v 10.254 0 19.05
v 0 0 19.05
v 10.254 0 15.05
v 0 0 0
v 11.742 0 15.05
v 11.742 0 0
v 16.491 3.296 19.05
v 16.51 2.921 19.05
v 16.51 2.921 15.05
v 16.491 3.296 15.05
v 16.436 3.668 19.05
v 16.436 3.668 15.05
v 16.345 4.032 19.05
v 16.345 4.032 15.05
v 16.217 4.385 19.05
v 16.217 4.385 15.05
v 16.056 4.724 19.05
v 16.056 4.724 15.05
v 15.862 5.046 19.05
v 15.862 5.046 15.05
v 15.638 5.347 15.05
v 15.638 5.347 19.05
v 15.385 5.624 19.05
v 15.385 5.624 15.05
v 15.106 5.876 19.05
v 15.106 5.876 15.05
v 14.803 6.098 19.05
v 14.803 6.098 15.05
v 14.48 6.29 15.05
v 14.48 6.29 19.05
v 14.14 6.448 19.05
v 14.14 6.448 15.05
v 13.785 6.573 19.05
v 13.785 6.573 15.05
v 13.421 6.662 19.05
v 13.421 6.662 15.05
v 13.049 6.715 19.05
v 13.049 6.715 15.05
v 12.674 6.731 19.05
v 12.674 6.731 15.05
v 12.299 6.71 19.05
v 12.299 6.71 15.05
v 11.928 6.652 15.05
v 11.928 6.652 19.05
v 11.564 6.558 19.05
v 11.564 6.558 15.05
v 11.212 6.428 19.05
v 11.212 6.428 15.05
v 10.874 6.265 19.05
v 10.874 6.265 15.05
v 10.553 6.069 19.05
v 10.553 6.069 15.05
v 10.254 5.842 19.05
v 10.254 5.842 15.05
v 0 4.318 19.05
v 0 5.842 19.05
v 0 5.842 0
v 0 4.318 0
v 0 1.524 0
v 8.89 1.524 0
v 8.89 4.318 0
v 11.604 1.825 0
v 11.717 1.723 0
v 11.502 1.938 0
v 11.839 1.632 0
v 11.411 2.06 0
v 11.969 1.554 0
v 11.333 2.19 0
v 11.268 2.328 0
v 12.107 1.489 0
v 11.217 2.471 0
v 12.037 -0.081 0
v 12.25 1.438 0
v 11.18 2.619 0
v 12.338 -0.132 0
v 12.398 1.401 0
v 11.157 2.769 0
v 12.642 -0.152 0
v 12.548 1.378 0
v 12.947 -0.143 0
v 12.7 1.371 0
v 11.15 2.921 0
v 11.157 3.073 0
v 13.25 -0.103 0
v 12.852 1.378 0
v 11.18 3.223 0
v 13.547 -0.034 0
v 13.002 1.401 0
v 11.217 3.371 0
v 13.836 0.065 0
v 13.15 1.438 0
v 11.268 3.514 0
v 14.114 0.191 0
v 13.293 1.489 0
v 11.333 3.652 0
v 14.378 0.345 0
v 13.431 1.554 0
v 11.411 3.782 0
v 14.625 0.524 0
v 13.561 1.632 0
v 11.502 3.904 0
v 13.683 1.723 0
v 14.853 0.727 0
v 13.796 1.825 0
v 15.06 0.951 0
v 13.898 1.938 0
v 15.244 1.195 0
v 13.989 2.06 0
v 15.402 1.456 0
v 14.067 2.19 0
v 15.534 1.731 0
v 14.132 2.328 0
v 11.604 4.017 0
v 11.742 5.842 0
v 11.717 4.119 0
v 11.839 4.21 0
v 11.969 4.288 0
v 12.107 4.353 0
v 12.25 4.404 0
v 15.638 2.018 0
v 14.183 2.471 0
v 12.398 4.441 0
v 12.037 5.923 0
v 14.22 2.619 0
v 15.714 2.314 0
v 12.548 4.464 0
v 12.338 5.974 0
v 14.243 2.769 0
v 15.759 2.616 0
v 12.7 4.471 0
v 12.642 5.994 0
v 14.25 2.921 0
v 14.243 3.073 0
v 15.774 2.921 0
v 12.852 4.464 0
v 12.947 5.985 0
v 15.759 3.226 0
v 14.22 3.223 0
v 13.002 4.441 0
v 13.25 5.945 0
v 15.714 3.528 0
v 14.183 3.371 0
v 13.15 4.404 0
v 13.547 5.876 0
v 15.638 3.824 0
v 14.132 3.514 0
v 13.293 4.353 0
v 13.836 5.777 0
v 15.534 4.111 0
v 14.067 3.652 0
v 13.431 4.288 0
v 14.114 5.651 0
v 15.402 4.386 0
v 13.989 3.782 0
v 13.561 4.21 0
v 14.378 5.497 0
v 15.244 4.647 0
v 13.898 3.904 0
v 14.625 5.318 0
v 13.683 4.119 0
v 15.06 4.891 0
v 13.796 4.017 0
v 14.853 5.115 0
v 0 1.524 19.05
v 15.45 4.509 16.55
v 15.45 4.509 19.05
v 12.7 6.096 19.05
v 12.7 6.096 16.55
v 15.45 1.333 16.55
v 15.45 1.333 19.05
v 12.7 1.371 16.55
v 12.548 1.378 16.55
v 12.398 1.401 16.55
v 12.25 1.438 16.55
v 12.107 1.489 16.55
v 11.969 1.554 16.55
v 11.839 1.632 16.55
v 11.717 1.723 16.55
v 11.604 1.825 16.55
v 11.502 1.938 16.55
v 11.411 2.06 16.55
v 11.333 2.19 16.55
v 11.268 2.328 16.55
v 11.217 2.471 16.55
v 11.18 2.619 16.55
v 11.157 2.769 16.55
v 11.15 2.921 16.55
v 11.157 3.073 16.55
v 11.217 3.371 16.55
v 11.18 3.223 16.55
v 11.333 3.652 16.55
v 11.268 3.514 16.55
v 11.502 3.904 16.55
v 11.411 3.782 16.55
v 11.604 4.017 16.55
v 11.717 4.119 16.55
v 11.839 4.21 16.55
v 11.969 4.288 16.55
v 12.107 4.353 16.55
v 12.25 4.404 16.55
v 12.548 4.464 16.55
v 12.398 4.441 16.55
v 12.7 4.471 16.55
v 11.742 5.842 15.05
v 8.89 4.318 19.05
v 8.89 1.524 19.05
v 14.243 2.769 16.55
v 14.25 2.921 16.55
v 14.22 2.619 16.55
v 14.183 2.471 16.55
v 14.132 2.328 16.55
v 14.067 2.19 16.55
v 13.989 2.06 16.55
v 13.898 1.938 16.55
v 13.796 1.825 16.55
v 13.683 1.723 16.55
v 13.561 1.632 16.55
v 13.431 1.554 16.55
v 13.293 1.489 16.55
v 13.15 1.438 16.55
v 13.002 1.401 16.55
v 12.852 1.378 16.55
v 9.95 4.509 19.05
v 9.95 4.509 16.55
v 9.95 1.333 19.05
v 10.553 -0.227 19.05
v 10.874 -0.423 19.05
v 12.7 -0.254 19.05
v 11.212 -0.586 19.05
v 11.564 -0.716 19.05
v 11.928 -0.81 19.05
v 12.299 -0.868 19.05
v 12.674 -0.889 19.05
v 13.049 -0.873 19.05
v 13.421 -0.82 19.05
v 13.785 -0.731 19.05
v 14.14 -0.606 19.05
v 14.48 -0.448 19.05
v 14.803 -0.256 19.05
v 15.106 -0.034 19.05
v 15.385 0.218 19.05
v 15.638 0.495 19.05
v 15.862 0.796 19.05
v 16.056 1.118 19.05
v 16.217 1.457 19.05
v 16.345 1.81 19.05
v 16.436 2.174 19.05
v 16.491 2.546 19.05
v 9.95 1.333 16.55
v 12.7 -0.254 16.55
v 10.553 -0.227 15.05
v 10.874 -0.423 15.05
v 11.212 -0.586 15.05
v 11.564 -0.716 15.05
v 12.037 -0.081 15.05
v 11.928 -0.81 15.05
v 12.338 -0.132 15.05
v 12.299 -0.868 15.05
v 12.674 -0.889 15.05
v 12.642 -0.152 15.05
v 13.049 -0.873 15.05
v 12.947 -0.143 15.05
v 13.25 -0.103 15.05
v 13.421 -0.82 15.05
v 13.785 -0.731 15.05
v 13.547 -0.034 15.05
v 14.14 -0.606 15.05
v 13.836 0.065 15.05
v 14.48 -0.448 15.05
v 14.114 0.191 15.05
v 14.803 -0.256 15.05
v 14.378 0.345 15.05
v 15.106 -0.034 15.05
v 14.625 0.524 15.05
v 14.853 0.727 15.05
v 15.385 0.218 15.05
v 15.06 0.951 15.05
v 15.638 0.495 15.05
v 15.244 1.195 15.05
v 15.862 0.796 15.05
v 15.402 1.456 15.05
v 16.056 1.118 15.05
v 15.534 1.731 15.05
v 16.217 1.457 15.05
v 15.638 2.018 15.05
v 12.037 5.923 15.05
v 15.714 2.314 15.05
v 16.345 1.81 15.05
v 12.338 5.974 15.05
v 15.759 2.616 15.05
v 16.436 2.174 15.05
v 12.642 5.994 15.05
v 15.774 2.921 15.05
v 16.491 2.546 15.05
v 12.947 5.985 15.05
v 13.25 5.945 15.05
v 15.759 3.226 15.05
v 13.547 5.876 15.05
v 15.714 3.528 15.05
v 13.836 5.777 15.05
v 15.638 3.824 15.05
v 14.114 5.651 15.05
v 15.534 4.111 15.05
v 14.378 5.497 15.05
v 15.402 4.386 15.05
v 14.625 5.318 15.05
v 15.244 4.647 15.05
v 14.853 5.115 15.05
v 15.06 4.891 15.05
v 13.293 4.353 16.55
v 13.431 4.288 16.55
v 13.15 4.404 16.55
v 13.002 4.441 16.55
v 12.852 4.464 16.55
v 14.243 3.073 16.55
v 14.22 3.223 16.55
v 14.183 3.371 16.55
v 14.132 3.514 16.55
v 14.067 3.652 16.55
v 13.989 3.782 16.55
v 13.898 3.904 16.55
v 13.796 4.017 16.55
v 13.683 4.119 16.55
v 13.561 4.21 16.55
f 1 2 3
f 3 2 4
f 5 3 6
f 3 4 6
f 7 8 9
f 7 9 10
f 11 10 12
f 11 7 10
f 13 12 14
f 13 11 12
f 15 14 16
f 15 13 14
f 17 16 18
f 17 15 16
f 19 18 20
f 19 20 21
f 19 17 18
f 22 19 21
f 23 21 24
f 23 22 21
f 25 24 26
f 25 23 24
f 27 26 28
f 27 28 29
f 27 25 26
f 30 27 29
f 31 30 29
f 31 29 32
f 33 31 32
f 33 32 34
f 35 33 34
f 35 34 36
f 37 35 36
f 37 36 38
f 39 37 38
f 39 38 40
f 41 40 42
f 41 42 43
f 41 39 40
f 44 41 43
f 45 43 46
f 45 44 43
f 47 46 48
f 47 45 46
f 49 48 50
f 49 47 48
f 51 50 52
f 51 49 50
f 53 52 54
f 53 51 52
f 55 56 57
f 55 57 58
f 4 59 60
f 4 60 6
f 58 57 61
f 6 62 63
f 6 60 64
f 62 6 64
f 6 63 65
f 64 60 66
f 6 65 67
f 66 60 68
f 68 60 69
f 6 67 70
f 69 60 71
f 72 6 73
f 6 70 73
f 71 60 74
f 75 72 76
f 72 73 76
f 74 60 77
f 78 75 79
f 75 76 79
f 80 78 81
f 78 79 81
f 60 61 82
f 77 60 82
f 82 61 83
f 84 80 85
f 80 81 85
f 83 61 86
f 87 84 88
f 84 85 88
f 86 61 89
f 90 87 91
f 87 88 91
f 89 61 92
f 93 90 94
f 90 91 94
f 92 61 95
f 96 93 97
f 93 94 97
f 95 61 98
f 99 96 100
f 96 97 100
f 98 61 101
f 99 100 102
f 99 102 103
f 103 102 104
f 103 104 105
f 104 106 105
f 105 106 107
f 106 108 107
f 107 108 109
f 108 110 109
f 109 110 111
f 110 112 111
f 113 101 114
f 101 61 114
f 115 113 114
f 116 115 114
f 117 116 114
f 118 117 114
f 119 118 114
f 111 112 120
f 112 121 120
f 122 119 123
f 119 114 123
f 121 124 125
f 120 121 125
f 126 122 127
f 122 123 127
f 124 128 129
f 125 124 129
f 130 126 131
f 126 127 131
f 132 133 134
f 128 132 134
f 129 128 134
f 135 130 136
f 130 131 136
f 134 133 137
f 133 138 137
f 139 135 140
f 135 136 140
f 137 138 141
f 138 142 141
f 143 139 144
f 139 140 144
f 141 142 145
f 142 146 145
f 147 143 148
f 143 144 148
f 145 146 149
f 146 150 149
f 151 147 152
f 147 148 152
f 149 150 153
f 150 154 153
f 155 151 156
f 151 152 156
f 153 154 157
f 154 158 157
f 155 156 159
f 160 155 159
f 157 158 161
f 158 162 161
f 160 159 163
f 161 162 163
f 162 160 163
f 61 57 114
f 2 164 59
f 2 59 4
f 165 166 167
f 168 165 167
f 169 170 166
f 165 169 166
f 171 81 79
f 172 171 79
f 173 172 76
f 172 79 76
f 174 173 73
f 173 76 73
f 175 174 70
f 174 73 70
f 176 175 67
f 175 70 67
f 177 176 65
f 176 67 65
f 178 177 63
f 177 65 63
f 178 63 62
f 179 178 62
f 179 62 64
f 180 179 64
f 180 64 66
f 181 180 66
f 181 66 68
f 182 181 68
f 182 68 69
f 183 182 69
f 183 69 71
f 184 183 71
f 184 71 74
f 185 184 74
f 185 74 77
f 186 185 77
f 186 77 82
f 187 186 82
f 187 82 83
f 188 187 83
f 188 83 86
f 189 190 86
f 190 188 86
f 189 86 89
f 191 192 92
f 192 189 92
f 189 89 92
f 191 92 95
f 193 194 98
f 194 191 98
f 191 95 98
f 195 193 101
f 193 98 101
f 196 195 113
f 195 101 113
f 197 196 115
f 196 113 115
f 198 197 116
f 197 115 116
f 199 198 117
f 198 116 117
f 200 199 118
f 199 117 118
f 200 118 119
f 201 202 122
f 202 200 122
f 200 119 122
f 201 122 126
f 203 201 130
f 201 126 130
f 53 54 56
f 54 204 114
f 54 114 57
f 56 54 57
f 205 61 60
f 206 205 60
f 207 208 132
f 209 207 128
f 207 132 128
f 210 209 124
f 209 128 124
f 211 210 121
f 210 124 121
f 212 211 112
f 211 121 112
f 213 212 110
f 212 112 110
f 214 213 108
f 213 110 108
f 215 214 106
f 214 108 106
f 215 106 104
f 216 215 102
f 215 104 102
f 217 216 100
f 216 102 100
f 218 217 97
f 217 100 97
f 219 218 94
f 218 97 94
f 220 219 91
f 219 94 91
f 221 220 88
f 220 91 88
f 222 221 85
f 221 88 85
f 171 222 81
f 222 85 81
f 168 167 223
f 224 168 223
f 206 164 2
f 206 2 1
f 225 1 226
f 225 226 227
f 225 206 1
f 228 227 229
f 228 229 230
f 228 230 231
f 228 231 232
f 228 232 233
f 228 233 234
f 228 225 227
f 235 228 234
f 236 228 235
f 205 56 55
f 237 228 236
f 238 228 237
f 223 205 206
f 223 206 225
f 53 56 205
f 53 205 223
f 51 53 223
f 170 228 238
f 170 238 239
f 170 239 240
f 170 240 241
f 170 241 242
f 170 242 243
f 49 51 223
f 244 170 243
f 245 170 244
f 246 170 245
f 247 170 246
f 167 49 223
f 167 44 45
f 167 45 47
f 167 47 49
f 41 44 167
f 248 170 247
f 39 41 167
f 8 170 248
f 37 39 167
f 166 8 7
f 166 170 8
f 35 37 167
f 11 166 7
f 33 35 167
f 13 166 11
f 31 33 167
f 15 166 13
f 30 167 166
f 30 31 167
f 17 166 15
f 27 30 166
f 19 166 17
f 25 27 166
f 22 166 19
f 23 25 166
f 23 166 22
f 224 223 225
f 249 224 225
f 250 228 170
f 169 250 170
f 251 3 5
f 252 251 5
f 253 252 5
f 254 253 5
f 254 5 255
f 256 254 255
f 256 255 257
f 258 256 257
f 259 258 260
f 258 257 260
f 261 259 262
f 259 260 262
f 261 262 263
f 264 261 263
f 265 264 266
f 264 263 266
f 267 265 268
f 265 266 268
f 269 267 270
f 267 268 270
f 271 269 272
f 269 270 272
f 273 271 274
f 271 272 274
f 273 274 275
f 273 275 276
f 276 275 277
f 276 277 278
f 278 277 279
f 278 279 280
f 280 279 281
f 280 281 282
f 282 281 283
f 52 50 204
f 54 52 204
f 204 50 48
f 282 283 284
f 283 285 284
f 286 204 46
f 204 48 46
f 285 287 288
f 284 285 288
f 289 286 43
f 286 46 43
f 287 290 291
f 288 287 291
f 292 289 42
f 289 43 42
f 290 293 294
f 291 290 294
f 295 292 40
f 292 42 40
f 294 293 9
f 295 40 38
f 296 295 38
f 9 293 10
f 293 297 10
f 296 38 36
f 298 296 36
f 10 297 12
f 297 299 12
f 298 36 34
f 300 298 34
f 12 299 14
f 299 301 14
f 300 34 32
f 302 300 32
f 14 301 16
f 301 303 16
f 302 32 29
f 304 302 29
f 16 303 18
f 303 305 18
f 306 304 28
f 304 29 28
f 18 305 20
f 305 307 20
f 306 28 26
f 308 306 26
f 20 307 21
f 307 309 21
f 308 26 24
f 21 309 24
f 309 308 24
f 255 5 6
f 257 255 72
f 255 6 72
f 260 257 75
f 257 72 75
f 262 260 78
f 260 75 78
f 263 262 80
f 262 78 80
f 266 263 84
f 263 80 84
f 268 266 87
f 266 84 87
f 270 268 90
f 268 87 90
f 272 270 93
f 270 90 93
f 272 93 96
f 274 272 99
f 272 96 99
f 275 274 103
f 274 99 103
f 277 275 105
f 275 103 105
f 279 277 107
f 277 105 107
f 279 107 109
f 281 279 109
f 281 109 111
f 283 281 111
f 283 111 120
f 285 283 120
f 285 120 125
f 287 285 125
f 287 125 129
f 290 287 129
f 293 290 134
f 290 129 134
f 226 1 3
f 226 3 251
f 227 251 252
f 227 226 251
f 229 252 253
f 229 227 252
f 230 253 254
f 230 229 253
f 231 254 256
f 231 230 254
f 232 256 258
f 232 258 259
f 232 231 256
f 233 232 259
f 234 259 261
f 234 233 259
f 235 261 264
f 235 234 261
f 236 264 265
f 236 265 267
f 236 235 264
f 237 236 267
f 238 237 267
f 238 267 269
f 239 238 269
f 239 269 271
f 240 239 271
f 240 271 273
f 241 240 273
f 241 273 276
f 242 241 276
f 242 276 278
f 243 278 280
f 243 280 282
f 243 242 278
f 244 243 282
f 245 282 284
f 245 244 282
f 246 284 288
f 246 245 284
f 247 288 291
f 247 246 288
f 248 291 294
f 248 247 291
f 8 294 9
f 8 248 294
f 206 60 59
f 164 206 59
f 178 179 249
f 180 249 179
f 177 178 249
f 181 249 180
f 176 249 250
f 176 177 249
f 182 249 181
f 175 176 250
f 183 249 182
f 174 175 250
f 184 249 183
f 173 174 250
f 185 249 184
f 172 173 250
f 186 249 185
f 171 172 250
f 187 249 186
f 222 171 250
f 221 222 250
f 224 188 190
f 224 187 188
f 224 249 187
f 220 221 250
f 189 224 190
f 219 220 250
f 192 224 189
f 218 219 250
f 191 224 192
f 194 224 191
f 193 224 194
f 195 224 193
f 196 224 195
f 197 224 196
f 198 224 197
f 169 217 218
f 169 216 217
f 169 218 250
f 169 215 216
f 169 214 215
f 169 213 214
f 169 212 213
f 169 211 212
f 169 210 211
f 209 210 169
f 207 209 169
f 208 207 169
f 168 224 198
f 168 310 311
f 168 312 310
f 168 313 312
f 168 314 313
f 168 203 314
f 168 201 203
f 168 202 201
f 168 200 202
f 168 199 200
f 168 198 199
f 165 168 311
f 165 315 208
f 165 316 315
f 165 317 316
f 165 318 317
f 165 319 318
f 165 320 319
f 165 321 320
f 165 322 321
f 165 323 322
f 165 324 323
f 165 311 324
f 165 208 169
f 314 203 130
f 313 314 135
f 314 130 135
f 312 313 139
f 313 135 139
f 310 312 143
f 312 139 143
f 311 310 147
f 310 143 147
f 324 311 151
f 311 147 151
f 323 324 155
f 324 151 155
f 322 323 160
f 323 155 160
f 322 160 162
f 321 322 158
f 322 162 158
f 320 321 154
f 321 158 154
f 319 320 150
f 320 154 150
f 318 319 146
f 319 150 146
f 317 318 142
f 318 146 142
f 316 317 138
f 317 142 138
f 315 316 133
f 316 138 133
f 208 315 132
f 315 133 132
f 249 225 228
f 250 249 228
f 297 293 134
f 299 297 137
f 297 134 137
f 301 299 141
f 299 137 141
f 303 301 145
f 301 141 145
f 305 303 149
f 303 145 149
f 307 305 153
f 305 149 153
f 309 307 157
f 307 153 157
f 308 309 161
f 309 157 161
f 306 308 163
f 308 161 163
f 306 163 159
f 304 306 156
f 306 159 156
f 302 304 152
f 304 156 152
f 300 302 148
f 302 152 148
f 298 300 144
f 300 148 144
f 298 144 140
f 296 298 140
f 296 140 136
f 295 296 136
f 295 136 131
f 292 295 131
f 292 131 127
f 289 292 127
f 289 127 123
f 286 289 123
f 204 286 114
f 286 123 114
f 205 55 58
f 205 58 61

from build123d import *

# Parameters (mm, degrees)
F1_DEPTH = 19.05
F3_DEPTH = 4
F4_R     = 1.55
F5_DEPTH = 2.5


with BuildPart() as f1:
    # F0 (on Top) → F1 (new body)
    with BuildSketch(Plane.XY):
        with BuildLine():
            Line((12.7, 0), (11.7422761358, 0))
            ThreePointArc((11.7422761358, 0), (14.5035288799, 0.4316708576), (15.774, 2.921))
            ThreePointArc((15.774, 2.921), (14.5035288799, 5.4103291424), (11.7422761358, 5.842))
            Line((11.7422761358, 5.842), (12.7, 5.842))
            Line((12.7, 5.842), (12.7, 4.471))
            ThreePointArc((12.7, 4.471), (13.7960155108, 4.0170155108), (14.25, 2.921))
            ThreePointArc((14.25, 2.921), (13.7960155108, 1.8249844892), (12.7, 1.371))
            Line((12.7, 1.371), (12.7, 0))
        make_face()
        with BuildLine():
            Line((0, 1.524), (0, 0))
            Line((0, 0), (11.7422761358, 0))
            ThreePointArc((11.7422761358, 0), (9.626, 2.921), (11.7422761358, 5.842))
            Line((11.7422761358, 5.842), (0, 5.842))
            Line((0, 5.842), (0, 4.318))
            Line((0, 4.318), (8.89, 4.318))
            Line((8.89, 4.318), (8.89, 1.524))
            Line((8.89, 1.524), (0, 1.524))
        make_face()
        with BuildLine():
            ThreePointArc((11.7422761358, 5.842), (9.626, 2.921), (11.7422761358, 0))
            Line((11.7422761358, 0), (12.7, 0))
            Line((12.7, 0), (12.7, 1.371))
            ThreePointArc((12.7, 1.371), (11.15, 2.921), (12.7, 4.471))
            Line((12.7, 4.471), (12.7, 5.842))
            Line((12.7, 5.842), (11.7422761358, 5.842))
        make_face()
    extrude(amount=F1_DEPTH)

    # F2 (on face) → F3 (join)
    with BuildSketch(Plane.XY.offset(19.05)):
        with BuildLine():
            ThreePointArc((10.2538072439, 0), (14.3118476354, -0.5312524821), (16.51, 2.921))
            ThreePointArc((16.51, 2.921), (14.3118476354, 6.3732524821), (10.2538072439, 5.842))
            Line((10.2538072439, 5.842), (11.7422761358, 5.842))
            ThreePointArc((11.7422761358, 5.842), (15.774, 2.921), (11.7422761358, 0))
            Line((11.7422761358, 0), (10.2538072439, 0))
        make_face()
    extrude(amount=-F3_DEPTH)

    # F4 (on face) → F5 (cut)
    with BuildSketch(Plane.XY.offset(19.05)):
        Polygon((15.45, 4.5087132403), (12.7, 6.0964264805), (9.95, 4.5087132403), (9.95, 1.3332867597), (12.7, -0.2544264805), (15.45, 1.3332867597), align=None)
        with Locations((12.7, 2.921)):
            Circle(F4_R, mode=Mode.SUBTRACT)
    extrude(amount=-F5_DEPTH, mode=Mode.SUBTRACT)


solid = f1.part
